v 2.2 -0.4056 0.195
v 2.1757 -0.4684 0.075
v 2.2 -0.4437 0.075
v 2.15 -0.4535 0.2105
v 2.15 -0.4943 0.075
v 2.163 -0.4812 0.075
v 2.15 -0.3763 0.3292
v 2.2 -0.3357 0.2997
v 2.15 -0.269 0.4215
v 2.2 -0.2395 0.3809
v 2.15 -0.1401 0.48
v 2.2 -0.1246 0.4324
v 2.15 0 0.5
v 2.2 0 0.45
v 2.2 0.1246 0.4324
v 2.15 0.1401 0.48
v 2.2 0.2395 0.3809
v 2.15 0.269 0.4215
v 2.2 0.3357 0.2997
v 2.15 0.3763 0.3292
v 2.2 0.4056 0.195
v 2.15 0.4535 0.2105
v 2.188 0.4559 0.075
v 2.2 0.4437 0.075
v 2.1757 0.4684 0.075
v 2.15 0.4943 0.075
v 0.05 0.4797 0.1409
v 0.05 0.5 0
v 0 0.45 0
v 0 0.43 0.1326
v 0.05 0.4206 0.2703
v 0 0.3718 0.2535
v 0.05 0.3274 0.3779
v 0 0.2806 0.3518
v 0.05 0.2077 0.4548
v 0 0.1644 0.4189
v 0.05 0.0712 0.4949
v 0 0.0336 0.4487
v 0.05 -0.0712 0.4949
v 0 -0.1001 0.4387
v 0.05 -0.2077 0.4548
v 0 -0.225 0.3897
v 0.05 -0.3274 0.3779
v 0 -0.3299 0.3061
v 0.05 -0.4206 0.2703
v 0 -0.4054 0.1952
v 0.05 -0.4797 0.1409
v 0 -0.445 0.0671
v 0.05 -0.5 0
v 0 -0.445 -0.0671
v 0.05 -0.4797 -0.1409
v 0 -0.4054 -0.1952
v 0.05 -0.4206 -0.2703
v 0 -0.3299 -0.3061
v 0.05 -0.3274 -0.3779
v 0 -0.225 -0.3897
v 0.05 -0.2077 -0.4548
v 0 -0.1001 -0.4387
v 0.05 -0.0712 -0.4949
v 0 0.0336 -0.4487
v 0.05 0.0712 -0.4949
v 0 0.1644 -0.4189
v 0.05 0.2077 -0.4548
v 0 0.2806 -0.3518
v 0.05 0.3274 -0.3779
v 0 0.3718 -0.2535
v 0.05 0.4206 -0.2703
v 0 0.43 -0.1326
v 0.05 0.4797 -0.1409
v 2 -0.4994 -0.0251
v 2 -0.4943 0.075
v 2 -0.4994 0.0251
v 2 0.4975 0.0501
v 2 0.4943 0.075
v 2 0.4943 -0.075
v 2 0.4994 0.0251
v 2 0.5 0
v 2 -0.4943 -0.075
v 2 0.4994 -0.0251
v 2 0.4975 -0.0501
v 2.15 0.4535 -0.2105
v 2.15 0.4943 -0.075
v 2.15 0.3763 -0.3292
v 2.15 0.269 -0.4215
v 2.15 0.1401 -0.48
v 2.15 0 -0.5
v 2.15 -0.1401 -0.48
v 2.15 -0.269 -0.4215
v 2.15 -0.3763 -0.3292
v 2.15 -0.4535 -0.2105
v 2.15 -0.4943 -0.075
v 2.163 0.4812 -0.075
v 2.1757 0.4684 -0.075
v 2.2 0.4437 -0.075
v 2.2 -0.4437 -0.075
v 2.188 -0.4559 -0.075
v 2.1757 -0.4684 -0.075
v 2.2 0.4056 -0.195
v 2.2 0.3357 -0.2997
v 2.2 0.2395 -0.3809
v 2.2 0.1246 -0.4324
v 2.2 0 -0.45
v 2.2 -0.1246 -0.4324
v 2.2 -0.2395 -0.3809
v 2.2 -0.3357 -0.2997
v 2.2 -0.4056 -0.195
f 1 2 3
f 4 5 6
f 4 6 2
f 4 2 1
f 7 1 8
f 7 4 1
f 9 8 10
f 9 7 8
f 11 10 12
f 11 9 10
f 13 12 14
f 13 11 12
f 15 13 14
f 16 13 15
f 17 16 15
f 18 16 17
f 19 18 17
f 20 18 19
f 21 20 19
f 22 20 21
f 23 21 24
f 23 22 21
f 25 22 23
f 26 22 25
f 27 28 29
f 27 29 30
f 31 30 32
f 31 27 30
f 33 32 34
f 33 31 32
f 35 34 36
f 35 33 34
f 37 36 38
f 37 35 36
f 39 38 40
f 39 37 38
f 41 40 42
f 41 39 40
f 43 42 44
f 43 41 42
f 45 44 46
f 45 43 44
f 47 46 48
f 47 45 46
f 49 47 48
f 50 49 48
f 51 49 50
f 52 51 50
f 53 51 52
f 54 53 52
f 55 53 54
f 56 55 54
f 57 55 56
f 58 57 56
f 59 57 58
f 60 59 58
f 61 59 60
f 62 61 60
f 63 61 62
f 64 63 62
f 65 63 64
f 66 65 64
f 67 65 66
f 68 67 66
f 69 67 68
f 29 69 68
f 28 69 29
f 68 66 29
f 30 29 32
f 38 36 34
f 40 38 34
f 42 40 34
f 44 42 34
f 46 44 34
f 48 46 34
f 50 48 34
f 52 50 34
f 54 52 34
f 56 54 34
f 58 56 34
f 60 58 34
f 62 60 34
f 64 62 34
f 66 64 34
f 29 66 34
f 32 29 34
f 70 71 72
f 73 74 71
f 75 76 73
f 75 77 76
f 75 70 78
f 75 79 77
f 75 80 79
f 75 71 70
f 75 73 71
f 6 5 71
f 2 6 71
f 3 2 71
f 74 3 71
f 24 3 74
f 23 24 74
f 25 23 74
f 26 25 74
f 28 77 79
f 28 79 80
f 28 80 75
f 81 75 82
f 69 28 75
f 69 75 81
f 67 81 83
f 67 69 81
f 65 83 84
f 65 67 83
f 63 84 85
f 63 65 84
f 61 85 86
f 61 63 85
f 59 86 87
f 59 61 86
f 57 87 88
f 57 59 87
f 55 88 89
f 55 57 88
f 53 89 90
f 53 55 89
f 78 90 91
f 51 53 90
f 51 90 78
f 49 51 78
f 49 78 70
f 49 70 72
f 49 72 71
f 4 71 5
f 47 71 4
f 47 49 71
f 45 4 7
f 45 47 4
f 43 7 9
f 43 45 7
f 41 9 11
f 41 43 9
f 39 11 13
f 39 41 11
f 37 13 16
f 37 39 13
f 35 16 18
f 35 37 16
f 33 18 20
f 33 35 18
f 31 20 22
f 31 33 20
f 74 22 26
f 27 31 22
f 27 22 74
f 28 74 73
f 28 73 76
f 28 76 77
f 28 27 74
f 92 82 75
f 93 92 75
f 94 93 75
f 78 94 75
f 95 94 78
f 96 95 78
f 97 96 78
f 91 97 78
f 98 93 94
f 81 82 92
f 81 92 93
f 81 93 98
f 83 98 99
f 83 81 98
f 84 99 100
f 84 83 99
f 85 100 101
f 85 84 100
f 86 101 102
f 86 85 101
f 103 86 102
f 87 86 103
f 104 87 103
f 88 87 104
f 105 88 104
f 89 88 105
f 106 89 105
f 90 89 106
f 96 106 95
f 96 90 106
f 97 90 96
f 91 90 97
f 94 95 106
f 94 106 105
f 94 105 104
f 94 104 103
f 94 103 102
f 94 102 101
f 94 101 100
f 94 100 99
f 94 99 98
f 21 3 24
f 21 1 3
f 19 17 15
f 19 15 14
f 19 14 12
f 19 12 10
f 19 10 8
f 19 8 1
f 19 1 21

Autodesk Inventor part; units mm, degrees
ref_plane "YZ Plane" through (0, 0, 0) normal (1, 0, 0) x (0, 1, 0)
ref_plane "XZ Plane" through (0, 0, 0) normal (0, 1, 0) x (-1, 0, 0)
ref_plane "XY Plane" through (0, 0, 0) normal (0, 0, 1) x (1, 0, 0)
sketch "Sketch1" plane through (0, 0, 0) normal (0, 0, 1) x (1, 0, 0)
  line L0 (0, 0) -> (2.2, 0)
  line L1 (2.2, 0.5) -> (0, 0.5)
  line L2 (0, 0) -> (0, 0.5)
  line L3 (0, 0) -> (2.2, 0) construction
  line L4 (2.2, 0.5) -> (2.2, 0)
  dimension "d25" = 0.5
  dimension "d43" = 2.2
revolve "Revolution1" add sketch "Sketch1" angle 360 about axis through (0, 0, 0) along (1, 0, 0)
chamfer "Chamfer1" distance 0.05 angle 45 2 edges at (0, -0.5, 0) (2.2, -0.5, 0)
thread "Thread4" size "M1x0.25" class "6g" standard "ANSI Metric M Profile" full length
sketch "Sketch4" plane through (2.2, 0, 0) normal (1, 0, 0) x (0, 0, -1)
  circle A0 centre (0, 0) radius 0.45 projected
  line L0 (-0.075, 0.7107) -> (0.075, 0.7107)
  line L1 (0.075, 0.7107) -> (0.075, -0.5992)
  line L2 (0.075, -0.5992) -> (-0.075, -0.5992)
  line L3 (-0.075, -0.5992) -> (-0.075, 0.7107)
  dimension "d46" = 0.15
  dimension "d47" = 0.075
extrude "Extrusion3" cut sketch "Sketch4" against normal blind 0.2 contours L1 A0 L3 | A0 L3 L0 L1 | L1 L2 L3 A0
properties part number "Screw1G"
